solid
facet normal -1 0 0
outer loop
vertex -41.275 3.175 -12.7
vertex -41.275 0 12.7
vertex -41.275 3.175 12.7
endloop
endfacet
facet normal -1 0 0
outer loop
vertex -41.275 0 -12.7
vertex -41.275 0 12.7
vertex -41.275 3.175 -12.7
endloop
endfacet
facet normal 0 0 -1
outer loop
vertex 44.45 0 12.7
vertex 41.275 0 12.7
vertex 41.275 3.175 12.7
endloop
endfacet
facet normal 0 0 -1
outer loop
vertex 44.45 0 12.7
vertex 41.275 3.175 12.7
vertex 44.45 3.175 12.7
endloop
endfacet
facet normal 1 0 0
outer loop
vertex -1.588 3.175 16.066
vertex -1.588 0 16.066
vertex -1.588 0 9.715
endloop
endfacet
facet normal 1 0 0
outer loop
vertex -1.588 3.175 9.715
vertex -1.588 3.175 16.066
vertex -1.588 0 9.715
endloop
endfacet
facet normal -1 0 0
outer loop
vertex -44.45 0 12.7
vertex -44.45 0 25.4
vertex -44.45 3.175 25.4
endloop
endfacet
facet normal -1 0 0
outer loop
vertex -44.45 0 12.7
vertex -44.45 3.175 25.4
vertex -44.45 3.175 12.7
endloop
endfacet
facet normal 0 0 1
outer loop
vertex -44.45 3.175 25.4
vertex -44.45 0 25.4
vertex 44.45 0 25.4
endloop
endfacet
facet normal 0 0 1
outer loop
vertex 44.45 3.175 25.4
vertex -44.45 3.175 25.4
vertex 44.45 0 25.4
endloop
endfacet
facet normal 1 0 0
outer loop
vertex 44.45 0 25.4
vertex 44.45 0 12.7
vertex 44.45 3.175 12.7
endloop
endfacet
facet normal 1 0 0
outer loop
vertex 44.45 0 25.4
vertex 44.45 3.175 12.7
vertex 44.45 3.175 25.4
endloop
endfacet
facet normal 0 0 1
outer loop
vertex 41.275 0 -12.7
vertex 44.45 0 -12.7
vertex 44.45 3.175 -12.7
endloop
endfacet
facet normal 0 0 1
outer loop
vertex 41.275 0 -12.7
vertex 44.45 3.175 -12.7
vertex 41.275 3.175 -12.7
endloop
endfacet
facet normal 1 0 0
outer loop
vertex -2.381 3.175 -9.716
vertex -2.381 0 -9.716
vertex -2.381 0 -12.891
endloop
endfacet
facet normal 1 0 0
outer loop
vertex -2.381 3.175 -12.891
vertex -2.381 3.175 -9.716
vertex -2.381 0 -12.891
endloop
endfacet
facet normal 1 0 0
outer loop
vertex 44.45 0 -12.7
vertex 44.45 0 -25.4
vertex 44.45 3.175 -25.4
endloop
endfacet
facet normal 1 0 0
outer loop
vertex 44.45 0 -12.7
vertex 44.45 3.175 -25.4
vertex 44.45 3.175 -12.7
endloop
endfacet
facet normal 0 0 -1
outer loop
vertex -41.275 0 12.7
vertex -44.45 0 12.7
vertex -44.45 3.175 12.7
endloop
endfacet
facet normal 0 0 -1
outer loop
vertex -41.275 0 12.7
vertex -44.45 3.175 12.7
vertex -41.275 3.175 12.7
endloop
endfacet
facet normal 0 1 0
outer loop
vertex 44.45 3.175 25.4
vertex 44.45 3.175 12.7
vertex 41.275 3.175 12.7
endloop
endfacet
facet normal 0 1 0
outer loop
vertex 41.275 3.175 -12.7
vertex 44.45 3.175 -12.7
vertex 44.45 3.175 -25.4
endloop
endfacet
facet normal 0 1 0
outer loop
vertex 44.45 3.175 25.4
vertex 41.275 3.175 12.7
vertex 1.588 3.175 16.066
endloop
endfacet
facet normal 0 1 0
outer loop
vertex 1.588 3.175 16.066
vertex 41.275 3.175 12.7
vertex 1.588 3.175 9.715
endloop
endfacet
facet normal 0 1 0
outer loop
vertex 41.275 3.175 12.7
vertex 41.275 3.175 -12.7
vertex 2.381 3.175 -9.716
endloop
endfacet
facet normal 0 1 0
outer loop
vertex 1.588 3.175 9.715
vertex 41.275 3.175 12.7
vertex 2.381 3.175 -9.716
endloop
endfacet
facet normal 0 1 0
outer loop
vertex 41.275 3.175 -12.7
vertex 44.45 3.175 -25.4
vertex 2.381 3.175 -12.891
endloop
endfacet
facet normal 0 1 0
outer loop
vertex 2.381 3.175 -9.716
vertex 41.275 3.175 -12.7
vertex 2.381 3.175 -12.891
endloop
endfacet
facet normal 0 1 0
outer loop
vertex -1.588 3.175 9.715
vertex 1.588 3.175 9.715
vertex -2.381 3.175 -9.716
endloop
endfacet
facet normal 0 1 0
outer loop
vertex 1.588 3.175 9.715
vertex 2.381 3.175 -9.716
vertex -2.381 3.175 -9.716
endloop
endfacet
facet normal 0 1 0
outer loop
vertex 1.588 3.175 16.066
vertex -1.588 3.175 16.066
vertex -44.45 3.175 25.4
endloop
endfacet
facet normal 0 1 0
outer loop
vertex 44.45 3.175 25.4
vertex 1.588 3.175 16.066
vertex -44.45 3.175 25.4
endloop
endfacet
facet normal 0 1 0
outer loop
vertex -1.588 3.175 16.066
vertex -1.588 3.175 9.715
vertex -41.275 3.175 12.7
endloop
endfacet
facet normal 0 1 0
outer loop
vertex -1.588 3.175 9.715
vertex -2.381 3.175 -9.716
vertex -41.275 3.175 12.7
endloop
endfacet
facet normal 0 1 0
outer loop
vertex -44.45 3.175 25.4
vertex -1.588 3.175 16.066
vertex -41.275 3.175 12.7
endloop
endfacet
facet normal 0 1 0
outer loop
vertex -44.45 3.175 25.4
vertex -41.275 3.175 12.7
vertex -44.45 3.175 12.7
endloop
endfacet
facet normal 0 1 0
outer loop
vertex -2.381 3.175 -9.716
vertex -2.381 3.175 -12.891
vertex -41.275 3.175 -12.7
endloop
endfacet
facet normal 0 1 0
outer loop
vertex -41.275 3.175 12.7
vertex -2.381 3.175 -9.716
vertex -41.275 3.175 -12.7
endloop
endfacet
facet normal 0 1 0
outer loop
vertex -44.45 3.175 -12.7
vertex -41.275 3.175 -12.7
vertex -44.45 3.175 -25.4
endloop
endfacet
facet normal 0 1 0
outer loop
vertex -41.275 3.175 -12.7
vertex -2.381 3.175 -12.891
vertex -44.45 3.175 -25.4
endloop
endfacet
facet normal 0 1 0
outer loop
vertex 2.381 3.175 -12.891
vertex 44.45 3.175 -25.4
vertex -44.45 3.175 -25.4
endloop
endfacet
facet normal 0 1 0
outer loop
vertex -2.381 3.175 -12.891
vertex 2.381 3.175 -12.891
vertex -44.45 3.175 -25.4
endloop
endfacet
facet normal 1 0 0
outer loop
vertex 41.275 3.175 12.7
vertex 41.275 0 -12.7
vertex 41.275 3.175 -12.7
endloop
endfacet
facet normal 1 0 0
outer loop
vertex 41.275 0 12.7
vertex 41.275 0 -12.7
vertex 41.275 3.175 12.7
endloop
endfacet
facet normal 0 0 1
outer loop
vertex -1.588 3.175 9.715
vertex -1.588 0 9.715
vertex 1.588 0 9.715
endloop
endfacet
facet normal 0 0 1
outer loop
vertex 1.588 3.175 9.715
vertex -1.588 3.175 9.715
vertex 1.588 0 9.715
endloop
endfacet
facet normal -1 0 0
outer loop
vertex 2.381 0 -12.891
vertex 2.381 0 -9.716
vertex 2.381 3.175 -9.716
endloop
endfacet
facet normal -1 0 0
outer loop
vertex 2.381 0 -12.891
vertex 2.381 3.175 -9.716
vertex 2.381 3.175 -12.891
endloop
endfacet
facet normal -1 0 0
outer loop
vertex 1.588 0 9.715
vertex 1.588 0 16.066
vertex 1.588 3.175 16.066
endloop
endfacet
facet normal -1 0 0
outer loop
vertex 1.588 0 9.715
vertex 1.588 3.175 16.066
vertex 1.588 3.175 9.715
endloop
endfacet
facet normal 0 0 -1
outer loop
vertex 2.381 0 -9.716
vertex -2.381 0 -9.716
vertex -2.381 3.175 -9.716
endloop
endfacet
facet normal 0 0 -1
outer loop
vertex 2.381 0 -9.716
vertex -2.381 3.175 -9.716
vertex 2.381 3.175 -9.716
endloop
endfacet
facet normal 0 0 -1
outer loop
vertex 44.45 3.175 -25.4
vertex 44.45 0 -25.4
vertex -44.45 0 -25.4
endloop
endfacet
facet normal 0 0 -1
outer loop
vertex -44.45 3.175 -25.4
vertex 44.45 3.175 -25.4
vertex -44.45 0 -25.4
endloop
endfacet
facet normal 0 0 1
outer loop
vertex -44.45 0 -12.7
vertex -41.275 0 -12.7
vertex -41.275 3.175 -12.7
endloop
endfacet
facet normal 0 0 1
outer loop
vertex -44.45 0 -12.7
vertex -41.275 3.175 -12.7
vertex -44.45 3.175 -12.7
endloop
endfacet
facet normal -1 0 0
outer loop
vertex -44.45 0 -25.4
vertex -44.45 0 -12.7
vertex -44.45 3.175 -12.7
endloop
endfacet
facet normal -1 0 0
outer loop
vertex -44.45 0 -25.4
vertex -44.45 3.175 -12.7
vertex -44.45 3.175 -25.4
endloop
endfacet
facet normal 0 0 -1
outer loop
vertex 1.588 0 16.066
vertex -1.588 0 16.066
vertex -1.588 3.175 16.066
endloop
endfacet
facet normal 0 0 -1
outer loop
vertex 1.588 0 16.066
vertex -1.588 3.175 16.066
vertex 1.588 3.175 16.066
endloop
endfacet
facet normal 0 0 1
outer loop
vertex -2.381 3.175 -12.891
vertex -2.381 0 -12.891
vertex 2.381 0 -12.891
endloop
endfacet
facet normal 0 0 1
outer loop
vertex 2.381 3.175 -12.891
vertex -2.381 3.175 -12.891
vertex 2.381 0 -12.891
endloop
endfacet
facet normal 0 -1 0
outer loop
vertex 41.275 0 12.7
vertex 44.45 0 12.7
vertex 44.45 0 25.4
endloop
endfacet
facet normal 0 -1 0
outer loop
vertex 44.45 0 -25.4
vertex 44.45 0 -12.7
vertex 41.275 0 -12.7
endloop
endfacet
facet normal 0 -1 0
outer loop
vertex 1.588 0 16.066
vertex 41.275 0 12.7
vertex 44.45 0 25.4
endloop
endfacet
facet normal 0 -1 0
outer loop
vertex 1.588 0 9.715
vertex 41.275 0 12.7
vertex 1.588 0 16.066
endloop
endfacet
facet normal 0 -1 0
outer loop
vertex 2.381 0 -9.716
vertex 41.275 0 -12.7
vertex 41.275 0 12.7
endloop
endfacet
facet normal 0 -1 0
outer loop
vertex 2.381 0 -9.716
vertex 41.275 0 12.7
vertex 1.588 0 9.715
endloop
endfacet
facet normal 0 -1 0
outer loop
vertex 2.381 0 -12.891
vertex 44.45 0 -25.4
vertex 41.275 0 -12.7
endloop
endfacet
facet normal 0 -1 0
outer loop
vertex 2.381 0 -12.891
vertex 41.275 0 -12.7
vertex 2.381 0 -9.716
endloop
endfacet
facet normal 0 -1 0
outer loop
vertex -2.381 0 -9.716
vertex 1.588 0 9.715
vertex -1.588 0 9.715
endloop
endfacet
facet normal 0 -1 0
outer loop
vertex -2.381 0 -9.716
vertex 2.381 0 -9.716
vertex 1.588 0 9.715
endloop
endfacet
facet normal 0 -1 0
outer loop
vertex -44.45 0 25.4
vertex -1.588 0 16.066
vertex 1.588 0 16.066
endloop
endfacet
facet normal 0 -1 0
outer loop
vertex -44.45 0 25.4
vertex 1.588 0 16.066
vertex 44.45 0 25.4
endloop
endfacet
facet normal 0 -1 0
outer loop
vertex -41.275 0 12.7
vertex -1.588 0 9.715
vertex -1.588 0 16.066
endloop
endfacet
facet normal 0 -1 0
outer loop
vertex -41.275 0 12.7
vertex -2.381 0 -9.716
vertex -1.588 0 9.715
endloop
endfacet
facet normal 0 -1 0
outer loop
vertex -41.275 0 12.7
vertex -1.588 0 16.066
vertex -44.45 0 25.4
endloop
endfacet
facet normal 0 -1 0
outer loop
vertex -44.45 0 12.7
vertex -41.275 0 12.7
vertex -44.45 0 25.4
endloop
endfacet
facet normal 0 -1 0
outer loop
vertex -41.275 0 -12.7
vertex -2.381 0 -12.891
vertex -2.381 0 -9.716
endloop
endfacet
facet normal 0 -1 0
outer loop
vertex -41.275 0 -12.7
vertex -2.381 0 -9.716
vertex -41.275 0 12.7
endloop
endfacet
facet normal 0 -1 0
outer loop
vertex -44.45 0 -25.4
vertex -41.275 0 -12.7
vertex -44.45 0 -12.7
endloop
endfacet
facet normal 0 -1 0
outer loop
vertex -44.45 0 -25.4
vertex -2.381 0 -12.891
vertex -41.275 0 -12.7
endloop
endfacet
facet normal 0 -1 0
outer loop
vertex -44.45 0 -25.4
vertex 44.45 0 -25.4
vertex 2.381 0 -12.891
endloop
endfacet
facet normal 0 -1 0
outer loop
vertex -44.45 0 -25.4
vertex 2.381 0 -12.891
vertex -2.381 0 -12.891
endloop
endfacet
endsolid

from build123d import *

# Parameters (mm, degrees)
SKETCH1_W           = 4.7625
SKETCH1_H           = 3.175
SKETCH1_W_2         = 3.175
SKETCH1_H_2         = 6.35
BOSS_EXTRUDE1_DEPTH = 3.175


with BuildPart() as part:
    # Sketch1 → Boss-Extrude1 (new body)
    with BuildSketch(Plane(origin=(0, 0, 0), x_dir=(1, 0, 0), z_dir=(0, 1, 0))):
        Polygon((-41.275, -12.7), (-41.275, 12.7), (-44.45, 12.7), (-44.45, 25.4), (-41.275, 25.4), (41.275, 25.4), (44.45, 25.4), (44.45, 12.7), (41.275, 12.7), (41.275, -12.7), (44.45, -12.7), (44.45, -25.4), (41.275, -25.4), (-41.275, -25.4), (-44.45, -25.4), (-44.45, -12.7), align=None)
        with Locations((0, 11.303)):
            Rectangle(SKETCH1_W, SKETCH1_H, mode=Mode.SUBTRACT)
        with Locations((0, -12.8905)):
            Rectangle(SKETCH1_W_2, SKETCH1_H_2, mode=Mode.SUBTRACT)
    extrude(amount=BOSS_EXTRUDE1_DEPTH)


solid = part.part
